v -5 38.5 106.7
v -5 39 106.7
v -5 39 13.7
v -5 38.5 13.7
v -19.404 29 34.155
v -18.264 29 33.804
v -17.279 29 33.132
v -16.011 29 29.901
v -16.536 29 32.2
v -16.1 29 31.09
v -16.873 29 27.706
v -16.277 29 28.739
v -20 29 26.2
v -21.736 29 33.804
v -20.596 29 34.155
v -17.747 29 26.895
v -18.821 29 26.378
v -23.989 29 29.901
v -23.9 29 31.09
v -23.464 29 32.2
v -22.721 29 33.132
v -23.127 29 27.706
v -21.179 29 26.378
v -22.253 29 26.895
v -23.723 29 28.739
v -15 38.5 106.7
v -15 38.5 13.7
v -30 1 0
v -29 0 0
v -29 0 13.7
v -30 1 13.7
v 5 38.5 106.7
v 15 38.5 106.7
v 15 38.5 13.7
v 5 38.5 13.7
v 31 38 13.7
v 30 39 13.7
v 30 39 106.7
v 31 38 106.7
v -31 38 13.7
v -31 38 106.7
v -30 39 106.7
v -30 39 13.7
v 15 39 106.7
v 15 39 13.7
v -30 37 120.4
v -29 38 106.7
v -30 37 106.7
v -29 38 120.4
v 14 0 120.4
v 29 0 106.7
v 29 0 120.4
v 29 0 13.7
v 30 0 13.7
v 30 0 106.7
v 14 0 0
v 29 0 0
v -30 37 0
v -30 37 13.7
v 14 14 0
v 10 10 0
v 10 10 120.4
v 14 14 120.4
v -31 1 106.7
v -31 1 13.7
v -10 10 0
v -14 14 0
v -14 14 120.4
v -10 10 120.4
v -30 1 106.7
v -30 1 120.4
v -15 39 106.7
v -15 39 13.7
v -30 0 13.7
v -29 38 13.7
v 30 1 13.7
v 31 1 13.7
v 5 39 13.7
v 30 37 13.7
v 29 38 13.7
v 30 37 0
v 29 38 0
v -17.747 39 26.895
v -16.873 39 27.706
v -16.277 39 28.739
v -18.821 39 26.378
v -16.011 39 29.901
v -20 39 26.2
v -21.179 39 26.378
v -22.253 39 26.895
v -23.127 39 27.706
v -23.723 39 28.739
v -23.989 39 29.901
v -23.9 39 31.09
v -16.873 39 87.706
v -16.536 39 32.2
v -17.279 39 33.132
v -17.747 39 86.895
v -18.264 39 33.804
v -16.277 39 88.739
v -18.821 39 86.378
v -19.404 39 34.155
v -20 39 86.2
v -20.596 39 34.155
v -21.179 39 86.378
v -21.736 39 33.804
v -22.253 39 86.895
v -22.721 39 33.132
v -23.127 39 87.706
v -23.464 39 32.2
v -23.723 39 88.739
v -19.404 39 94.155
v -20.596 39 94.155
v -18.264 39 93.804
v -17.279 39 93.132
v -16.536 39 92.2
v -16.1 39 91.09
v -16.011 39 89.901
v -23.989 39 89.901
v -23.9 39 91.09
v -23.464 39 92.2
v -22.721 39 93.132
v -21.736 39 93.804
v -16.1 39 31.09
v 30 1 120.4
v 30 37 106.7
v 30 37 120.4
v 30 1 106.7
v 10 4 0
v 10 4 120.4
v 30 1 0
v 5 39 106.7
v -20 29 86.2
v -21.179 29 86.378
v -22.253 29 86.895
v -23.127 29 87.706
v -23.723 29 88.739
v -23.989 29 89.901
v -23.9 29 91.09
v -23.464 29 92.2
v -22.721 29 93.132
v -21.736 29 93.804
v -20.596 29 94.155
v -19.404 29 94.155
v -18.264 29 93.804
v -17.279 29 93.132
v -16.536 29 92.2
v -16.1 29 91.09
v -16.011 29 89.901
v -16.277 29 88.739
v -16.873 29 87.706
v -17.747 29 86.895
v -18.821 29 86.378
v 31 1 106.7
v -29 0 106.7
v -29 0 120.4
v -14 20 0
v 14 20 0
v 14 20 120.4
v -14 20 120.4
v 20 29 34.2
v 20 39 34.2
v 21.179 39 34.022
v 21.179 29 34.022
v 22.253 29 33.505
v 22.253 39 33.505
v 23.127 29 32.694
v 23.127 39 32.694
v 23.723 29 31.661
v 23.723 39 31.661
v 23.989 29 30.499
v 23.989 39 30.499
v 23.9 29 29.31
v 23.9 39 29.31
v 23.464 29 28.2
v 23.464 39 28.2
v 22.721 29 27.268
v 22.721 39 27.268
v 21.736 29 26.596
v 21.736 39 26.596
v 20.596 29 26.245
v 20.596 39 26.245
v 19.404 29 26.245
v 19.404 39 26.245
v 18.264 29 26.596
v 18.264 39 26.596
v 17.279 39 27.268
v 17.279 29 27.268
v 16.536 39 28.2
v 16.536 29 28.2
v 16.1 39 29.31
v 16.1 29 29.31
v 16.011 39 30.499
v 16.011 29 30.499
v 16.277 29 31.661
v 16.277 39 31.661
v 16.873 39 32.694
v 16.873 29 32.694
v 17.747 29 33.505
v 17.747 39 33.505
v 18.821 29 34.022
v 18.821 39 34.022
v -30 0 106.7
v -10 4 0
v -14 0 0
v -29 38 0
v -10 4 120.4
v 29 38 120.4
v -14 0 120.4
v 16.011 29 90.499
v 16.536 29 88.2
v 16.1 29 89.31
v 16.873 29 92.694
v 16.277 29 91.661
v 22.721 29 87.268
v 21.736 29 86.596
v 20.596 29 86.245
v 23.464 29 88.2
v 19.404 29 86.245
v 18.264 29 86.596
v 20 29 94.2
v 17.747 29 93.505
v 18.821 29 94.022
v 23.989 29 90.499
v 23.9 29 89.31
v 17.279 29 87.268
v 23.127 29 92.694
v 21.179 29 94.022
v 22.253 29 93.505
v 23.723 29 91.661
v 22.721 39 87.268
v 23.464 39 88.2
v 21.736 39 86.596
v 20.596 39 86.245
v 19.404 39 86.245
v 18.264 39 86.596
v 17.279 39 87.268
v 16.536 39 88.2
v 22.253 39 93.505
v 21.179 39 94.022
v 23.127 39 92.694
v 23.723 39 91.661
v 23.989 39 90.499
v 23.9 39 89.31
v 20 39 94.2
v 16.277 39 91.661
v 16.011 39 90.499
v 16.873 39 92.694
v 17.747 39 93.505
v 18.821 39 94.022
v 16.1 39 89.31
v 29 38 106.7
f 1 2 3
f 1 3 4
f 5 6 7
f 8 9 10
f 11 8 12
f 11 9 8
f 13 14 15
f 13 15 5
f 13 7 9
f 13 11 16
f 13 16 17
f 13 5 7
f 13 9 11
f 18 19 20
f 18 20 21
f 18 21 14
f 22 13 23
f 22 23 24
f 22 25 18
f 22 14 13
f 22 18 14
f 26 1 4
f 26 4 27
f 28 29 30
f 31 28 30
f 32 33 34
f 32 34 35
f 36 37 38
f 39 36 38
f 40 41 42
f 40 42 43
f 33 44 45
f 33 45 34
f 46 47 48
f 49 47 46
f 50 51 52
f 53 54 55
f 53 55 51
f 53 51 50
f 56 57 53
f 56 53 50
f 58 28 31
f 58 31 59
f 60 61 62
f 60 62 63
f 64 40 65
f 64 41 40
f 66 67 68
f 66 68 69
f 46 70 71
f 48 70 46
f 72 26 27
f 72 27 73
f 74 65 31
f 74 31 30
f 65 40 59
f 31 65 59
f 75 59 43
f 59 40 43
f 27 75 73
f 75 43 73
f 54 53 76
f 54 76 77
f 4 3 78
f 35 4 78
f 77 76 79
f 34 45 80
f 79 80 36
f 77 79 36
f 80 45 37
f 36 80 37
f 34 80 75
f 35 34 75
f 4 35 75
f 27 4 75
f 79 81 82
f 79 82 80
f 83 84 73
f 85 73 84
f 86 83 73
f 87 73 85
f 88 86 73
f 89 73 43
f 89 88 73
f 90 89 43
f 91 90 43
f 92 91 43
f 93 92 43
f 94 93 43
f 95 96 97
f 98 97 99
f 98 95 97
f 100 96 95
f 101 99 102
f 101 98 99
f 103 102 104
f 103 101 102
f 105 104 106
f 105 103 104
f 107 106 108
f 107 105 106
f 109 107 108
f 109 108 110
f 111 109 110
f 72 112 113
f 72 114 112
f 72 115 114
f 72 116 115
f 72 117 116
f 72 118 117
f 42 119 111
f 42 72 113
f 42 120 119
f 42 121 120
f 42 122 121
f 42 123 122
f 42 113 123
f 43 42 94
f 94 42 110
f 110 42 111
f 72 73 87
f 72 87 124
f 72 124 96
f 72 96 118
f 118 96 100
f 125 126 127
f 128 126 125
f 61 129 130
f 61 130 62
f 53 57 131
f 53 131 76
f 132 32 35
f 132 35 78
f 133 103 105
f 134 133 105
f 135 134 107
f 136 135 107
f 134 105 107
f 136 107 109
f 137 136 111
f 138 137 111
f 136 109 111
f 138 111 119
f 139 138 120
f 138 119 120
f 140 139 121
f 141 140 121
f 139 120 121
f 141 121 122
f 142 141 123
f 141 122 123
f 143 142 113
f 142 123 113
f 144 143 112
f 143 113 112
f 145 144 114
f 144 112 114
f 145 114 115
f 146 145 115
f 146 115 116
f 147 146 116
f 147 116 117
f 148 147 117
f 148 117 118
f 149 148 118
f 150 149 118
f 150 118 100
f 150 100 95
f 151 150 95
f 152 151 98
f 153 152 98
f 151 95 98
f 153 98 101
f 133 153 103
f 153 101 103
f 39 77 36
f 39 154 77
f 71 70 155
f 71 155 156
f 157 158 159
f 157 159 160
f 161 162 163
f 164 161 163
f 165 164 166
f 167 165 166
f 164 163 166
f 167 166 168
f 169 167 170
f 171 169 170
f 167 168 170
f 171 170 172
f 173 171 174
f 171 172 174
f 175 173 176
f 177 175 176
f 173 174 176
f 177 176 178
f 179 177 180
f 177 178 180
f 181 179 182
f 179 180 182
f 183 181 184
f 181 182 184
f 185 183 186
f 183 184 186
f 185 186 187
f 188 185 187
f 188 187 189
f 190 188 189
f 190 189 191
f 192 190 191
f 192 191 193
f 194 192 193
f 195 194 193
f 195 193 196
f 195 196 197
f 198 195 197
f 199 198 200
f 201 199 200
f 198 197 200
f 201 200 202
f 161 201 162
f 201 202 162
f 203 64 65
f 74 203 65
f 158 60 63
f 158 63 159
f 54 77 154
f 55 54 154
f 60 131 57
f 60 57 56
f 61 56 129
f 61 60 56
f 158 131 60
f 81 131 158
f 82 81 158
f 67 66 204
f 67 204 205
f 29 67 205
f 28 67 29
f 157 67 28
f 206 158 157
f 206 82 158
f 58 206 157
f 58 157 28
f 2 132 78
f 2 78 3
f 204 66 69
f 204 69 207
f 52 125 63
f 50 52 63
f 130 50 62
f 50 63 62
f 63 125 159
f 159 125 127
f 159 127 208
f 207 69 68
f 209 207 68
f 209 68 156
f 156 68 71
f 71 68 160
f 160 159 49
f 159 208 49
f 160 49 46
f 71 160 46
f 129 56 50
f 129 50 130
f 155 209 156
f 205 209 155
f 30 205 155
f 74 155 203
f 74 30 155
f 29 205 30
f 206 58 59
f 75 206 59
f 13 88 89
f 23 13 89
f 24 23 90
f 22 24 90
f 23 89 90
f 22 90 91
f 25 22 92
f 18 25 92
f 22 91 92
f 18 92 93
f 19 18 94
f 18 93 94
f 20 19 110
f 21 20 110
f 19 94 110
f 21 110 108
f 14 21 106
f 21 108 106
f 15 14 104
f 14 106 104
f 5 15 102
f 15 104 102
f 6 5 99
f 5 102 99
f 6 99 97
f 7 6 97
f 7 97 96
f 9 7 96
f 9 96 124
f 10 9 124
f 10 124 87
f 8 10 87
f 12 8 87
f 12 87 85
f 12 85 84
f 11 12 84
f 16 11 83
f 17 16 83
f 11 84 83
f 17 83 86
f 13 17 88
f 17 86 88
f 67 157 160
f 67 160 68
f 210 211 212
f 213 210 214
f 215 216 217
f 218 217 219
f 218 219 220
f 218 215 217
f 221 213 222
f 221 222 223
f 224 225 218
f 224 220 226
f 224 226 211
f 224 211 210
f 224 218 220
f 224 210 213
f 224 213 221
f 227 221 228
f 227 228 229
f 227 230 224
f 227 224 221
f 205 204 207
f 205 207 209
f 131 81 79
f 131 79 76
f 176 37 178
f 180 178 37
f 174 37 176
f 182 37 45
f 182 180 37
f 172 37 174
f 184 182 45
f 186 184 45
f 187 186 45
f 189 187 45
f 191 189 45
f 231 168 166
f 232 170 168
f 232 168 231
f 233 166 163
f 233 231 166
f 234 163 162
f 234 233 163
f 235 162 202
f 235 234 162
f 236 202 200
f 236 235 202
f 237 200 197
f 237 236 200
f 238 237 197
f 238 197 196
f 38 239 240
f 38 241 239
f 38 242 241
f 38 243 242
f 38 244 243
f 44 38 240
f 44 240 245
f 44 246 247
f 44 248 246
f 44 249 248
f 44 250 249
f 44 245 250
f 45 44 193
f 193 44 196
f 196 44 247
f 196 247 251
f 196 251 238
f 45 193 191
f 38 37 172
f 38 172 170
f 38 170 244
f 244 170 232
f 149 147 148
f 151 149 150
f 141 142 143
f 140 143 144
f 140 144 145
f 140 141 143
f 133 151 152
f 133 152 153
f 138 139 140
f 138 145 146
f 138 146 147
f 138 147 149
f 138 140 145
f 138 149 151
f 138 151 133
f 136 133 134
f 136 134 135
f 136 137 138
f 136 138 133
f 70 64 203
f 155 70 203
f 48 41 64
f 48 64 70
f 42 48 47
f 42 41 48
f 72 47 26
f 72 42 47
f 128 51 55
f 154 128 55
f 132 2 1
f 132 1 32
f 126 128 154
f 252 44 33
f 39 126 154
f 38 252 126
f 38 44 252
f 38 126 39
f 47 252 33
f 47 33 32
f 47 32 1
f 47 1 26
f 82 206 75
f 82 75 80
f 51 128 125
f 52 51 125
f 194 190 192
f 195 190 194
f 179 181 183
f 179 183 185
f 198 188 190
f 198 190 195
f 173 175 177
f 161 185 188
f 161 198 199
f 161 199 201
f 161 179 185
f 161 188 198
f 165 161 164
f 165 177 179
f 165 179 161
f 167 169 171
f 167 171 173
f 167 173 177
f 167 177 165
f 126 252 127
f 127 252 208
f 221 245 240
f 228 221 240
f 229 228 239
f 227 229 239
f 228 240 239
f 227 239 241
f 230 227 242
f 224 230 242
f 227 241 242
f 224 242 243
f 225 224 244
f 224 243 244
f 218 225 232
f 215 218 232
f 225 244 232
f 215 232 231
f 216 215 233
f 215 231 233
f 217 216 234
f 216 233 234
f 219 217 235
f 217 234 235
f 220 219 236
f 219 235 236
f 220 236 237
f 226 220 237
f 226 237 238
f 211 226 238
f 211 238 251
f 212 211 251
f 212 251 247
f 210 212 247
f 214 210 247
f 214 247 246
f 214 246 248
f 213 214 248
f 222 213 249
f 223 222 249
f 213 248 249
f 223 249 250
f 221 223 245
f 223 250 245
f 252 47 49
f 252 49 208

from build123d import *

# Parameters (mm, degrees)
EXTRUDE_1_DEPTH     = 120.4
EXTRUDE_2_DEPTH     = 46.5
SKETCH_4_R          = 4
CUT_EXTRUDE_1_DEPTH = 10
CHAMFER_1_SIZE      = 1


with BuildPart() as part:
    # 草图1 → 凸台-拉伸1 (new body)
    with BuildSketch(Plane.XY):
        Polygon((-30, 38), (30, 38), (30, 0), (14, 0), (10, 4), (10, 10), (14, 14), (14, 20), (-14, 20), (-14, 14), (-10, 10), (-10, 4), (-14, 0), (-30, 0), align=None)
    extrude(amount=EXTRUDE_1_DEPTH)

    # 草图2 → 凸台-拉伸2 (add, symmetric)
    with BuildSketch(Plane.XY.offset(60.2)):
        Polygon((-31, 0), (-30, 0), (-30, 38), (30, 38), (30, 0), (31, 0), (31, 39), (15, 39), (15, 38.5), (5, 38.5), (5, 39), (-5, 39), (-5, 38.5), (-15, 38.5), (-15, 39), (-31, 39), align=None)
    extrude(amount=EXTRUDE_2_DEPTH, both=True)

    # 草图4 → 切除-拉伸1 (cut)
    with BuildSketch(Plane(origin=(0, 39, 0), x_dir=(1, 0, 0), z_dir=(0, 1, 0))):
        with Locations(Location((20, -30.2, 0), (0, 0, 270))):
            Circle(SKETCH_4_R)
        with Locations(Location((20, -90.2, 0), (0, 0, 270))):
            Circle(SKETCH_4_R)
        with Locations(Location((-20, -90.2, 0), (0, 0, 90))):
            Circle(SKETCH_4_R)
        with Locations(Location((-20, -30.2, 0), (0, 0, 90))):
            Circle(SKETCH_4_R)
    extrude(amount=-CUT_EXTRUDE_1_DEPTH, mode=Mode.SUBTRACT)

    # 倒角1
    chamfer_1_edges = [part.edges().sort_by_distance(p)[0] for p in [
        (30, 0, 113.55),
        (31, 0, 60.2),
        (30, 0, 6.85),
        (-30, 38, 6.85),
        (30, 38, 6.85),
        (31, 39, 60.2),
        (30, 38, 113.55),
        (-31, 39, 60.2),
        (-30, 38, 113.55),
        (-30, 0, 6.85),
        (-30, 0, 113.55),
        (-31, 0, 60.2),
    ]]
    chamfer(chamfer_1_edges, length=CHAMFER_1_SIZE - 0.0001)  # a hair under: the kernel refuses the full size


solid = part.part
